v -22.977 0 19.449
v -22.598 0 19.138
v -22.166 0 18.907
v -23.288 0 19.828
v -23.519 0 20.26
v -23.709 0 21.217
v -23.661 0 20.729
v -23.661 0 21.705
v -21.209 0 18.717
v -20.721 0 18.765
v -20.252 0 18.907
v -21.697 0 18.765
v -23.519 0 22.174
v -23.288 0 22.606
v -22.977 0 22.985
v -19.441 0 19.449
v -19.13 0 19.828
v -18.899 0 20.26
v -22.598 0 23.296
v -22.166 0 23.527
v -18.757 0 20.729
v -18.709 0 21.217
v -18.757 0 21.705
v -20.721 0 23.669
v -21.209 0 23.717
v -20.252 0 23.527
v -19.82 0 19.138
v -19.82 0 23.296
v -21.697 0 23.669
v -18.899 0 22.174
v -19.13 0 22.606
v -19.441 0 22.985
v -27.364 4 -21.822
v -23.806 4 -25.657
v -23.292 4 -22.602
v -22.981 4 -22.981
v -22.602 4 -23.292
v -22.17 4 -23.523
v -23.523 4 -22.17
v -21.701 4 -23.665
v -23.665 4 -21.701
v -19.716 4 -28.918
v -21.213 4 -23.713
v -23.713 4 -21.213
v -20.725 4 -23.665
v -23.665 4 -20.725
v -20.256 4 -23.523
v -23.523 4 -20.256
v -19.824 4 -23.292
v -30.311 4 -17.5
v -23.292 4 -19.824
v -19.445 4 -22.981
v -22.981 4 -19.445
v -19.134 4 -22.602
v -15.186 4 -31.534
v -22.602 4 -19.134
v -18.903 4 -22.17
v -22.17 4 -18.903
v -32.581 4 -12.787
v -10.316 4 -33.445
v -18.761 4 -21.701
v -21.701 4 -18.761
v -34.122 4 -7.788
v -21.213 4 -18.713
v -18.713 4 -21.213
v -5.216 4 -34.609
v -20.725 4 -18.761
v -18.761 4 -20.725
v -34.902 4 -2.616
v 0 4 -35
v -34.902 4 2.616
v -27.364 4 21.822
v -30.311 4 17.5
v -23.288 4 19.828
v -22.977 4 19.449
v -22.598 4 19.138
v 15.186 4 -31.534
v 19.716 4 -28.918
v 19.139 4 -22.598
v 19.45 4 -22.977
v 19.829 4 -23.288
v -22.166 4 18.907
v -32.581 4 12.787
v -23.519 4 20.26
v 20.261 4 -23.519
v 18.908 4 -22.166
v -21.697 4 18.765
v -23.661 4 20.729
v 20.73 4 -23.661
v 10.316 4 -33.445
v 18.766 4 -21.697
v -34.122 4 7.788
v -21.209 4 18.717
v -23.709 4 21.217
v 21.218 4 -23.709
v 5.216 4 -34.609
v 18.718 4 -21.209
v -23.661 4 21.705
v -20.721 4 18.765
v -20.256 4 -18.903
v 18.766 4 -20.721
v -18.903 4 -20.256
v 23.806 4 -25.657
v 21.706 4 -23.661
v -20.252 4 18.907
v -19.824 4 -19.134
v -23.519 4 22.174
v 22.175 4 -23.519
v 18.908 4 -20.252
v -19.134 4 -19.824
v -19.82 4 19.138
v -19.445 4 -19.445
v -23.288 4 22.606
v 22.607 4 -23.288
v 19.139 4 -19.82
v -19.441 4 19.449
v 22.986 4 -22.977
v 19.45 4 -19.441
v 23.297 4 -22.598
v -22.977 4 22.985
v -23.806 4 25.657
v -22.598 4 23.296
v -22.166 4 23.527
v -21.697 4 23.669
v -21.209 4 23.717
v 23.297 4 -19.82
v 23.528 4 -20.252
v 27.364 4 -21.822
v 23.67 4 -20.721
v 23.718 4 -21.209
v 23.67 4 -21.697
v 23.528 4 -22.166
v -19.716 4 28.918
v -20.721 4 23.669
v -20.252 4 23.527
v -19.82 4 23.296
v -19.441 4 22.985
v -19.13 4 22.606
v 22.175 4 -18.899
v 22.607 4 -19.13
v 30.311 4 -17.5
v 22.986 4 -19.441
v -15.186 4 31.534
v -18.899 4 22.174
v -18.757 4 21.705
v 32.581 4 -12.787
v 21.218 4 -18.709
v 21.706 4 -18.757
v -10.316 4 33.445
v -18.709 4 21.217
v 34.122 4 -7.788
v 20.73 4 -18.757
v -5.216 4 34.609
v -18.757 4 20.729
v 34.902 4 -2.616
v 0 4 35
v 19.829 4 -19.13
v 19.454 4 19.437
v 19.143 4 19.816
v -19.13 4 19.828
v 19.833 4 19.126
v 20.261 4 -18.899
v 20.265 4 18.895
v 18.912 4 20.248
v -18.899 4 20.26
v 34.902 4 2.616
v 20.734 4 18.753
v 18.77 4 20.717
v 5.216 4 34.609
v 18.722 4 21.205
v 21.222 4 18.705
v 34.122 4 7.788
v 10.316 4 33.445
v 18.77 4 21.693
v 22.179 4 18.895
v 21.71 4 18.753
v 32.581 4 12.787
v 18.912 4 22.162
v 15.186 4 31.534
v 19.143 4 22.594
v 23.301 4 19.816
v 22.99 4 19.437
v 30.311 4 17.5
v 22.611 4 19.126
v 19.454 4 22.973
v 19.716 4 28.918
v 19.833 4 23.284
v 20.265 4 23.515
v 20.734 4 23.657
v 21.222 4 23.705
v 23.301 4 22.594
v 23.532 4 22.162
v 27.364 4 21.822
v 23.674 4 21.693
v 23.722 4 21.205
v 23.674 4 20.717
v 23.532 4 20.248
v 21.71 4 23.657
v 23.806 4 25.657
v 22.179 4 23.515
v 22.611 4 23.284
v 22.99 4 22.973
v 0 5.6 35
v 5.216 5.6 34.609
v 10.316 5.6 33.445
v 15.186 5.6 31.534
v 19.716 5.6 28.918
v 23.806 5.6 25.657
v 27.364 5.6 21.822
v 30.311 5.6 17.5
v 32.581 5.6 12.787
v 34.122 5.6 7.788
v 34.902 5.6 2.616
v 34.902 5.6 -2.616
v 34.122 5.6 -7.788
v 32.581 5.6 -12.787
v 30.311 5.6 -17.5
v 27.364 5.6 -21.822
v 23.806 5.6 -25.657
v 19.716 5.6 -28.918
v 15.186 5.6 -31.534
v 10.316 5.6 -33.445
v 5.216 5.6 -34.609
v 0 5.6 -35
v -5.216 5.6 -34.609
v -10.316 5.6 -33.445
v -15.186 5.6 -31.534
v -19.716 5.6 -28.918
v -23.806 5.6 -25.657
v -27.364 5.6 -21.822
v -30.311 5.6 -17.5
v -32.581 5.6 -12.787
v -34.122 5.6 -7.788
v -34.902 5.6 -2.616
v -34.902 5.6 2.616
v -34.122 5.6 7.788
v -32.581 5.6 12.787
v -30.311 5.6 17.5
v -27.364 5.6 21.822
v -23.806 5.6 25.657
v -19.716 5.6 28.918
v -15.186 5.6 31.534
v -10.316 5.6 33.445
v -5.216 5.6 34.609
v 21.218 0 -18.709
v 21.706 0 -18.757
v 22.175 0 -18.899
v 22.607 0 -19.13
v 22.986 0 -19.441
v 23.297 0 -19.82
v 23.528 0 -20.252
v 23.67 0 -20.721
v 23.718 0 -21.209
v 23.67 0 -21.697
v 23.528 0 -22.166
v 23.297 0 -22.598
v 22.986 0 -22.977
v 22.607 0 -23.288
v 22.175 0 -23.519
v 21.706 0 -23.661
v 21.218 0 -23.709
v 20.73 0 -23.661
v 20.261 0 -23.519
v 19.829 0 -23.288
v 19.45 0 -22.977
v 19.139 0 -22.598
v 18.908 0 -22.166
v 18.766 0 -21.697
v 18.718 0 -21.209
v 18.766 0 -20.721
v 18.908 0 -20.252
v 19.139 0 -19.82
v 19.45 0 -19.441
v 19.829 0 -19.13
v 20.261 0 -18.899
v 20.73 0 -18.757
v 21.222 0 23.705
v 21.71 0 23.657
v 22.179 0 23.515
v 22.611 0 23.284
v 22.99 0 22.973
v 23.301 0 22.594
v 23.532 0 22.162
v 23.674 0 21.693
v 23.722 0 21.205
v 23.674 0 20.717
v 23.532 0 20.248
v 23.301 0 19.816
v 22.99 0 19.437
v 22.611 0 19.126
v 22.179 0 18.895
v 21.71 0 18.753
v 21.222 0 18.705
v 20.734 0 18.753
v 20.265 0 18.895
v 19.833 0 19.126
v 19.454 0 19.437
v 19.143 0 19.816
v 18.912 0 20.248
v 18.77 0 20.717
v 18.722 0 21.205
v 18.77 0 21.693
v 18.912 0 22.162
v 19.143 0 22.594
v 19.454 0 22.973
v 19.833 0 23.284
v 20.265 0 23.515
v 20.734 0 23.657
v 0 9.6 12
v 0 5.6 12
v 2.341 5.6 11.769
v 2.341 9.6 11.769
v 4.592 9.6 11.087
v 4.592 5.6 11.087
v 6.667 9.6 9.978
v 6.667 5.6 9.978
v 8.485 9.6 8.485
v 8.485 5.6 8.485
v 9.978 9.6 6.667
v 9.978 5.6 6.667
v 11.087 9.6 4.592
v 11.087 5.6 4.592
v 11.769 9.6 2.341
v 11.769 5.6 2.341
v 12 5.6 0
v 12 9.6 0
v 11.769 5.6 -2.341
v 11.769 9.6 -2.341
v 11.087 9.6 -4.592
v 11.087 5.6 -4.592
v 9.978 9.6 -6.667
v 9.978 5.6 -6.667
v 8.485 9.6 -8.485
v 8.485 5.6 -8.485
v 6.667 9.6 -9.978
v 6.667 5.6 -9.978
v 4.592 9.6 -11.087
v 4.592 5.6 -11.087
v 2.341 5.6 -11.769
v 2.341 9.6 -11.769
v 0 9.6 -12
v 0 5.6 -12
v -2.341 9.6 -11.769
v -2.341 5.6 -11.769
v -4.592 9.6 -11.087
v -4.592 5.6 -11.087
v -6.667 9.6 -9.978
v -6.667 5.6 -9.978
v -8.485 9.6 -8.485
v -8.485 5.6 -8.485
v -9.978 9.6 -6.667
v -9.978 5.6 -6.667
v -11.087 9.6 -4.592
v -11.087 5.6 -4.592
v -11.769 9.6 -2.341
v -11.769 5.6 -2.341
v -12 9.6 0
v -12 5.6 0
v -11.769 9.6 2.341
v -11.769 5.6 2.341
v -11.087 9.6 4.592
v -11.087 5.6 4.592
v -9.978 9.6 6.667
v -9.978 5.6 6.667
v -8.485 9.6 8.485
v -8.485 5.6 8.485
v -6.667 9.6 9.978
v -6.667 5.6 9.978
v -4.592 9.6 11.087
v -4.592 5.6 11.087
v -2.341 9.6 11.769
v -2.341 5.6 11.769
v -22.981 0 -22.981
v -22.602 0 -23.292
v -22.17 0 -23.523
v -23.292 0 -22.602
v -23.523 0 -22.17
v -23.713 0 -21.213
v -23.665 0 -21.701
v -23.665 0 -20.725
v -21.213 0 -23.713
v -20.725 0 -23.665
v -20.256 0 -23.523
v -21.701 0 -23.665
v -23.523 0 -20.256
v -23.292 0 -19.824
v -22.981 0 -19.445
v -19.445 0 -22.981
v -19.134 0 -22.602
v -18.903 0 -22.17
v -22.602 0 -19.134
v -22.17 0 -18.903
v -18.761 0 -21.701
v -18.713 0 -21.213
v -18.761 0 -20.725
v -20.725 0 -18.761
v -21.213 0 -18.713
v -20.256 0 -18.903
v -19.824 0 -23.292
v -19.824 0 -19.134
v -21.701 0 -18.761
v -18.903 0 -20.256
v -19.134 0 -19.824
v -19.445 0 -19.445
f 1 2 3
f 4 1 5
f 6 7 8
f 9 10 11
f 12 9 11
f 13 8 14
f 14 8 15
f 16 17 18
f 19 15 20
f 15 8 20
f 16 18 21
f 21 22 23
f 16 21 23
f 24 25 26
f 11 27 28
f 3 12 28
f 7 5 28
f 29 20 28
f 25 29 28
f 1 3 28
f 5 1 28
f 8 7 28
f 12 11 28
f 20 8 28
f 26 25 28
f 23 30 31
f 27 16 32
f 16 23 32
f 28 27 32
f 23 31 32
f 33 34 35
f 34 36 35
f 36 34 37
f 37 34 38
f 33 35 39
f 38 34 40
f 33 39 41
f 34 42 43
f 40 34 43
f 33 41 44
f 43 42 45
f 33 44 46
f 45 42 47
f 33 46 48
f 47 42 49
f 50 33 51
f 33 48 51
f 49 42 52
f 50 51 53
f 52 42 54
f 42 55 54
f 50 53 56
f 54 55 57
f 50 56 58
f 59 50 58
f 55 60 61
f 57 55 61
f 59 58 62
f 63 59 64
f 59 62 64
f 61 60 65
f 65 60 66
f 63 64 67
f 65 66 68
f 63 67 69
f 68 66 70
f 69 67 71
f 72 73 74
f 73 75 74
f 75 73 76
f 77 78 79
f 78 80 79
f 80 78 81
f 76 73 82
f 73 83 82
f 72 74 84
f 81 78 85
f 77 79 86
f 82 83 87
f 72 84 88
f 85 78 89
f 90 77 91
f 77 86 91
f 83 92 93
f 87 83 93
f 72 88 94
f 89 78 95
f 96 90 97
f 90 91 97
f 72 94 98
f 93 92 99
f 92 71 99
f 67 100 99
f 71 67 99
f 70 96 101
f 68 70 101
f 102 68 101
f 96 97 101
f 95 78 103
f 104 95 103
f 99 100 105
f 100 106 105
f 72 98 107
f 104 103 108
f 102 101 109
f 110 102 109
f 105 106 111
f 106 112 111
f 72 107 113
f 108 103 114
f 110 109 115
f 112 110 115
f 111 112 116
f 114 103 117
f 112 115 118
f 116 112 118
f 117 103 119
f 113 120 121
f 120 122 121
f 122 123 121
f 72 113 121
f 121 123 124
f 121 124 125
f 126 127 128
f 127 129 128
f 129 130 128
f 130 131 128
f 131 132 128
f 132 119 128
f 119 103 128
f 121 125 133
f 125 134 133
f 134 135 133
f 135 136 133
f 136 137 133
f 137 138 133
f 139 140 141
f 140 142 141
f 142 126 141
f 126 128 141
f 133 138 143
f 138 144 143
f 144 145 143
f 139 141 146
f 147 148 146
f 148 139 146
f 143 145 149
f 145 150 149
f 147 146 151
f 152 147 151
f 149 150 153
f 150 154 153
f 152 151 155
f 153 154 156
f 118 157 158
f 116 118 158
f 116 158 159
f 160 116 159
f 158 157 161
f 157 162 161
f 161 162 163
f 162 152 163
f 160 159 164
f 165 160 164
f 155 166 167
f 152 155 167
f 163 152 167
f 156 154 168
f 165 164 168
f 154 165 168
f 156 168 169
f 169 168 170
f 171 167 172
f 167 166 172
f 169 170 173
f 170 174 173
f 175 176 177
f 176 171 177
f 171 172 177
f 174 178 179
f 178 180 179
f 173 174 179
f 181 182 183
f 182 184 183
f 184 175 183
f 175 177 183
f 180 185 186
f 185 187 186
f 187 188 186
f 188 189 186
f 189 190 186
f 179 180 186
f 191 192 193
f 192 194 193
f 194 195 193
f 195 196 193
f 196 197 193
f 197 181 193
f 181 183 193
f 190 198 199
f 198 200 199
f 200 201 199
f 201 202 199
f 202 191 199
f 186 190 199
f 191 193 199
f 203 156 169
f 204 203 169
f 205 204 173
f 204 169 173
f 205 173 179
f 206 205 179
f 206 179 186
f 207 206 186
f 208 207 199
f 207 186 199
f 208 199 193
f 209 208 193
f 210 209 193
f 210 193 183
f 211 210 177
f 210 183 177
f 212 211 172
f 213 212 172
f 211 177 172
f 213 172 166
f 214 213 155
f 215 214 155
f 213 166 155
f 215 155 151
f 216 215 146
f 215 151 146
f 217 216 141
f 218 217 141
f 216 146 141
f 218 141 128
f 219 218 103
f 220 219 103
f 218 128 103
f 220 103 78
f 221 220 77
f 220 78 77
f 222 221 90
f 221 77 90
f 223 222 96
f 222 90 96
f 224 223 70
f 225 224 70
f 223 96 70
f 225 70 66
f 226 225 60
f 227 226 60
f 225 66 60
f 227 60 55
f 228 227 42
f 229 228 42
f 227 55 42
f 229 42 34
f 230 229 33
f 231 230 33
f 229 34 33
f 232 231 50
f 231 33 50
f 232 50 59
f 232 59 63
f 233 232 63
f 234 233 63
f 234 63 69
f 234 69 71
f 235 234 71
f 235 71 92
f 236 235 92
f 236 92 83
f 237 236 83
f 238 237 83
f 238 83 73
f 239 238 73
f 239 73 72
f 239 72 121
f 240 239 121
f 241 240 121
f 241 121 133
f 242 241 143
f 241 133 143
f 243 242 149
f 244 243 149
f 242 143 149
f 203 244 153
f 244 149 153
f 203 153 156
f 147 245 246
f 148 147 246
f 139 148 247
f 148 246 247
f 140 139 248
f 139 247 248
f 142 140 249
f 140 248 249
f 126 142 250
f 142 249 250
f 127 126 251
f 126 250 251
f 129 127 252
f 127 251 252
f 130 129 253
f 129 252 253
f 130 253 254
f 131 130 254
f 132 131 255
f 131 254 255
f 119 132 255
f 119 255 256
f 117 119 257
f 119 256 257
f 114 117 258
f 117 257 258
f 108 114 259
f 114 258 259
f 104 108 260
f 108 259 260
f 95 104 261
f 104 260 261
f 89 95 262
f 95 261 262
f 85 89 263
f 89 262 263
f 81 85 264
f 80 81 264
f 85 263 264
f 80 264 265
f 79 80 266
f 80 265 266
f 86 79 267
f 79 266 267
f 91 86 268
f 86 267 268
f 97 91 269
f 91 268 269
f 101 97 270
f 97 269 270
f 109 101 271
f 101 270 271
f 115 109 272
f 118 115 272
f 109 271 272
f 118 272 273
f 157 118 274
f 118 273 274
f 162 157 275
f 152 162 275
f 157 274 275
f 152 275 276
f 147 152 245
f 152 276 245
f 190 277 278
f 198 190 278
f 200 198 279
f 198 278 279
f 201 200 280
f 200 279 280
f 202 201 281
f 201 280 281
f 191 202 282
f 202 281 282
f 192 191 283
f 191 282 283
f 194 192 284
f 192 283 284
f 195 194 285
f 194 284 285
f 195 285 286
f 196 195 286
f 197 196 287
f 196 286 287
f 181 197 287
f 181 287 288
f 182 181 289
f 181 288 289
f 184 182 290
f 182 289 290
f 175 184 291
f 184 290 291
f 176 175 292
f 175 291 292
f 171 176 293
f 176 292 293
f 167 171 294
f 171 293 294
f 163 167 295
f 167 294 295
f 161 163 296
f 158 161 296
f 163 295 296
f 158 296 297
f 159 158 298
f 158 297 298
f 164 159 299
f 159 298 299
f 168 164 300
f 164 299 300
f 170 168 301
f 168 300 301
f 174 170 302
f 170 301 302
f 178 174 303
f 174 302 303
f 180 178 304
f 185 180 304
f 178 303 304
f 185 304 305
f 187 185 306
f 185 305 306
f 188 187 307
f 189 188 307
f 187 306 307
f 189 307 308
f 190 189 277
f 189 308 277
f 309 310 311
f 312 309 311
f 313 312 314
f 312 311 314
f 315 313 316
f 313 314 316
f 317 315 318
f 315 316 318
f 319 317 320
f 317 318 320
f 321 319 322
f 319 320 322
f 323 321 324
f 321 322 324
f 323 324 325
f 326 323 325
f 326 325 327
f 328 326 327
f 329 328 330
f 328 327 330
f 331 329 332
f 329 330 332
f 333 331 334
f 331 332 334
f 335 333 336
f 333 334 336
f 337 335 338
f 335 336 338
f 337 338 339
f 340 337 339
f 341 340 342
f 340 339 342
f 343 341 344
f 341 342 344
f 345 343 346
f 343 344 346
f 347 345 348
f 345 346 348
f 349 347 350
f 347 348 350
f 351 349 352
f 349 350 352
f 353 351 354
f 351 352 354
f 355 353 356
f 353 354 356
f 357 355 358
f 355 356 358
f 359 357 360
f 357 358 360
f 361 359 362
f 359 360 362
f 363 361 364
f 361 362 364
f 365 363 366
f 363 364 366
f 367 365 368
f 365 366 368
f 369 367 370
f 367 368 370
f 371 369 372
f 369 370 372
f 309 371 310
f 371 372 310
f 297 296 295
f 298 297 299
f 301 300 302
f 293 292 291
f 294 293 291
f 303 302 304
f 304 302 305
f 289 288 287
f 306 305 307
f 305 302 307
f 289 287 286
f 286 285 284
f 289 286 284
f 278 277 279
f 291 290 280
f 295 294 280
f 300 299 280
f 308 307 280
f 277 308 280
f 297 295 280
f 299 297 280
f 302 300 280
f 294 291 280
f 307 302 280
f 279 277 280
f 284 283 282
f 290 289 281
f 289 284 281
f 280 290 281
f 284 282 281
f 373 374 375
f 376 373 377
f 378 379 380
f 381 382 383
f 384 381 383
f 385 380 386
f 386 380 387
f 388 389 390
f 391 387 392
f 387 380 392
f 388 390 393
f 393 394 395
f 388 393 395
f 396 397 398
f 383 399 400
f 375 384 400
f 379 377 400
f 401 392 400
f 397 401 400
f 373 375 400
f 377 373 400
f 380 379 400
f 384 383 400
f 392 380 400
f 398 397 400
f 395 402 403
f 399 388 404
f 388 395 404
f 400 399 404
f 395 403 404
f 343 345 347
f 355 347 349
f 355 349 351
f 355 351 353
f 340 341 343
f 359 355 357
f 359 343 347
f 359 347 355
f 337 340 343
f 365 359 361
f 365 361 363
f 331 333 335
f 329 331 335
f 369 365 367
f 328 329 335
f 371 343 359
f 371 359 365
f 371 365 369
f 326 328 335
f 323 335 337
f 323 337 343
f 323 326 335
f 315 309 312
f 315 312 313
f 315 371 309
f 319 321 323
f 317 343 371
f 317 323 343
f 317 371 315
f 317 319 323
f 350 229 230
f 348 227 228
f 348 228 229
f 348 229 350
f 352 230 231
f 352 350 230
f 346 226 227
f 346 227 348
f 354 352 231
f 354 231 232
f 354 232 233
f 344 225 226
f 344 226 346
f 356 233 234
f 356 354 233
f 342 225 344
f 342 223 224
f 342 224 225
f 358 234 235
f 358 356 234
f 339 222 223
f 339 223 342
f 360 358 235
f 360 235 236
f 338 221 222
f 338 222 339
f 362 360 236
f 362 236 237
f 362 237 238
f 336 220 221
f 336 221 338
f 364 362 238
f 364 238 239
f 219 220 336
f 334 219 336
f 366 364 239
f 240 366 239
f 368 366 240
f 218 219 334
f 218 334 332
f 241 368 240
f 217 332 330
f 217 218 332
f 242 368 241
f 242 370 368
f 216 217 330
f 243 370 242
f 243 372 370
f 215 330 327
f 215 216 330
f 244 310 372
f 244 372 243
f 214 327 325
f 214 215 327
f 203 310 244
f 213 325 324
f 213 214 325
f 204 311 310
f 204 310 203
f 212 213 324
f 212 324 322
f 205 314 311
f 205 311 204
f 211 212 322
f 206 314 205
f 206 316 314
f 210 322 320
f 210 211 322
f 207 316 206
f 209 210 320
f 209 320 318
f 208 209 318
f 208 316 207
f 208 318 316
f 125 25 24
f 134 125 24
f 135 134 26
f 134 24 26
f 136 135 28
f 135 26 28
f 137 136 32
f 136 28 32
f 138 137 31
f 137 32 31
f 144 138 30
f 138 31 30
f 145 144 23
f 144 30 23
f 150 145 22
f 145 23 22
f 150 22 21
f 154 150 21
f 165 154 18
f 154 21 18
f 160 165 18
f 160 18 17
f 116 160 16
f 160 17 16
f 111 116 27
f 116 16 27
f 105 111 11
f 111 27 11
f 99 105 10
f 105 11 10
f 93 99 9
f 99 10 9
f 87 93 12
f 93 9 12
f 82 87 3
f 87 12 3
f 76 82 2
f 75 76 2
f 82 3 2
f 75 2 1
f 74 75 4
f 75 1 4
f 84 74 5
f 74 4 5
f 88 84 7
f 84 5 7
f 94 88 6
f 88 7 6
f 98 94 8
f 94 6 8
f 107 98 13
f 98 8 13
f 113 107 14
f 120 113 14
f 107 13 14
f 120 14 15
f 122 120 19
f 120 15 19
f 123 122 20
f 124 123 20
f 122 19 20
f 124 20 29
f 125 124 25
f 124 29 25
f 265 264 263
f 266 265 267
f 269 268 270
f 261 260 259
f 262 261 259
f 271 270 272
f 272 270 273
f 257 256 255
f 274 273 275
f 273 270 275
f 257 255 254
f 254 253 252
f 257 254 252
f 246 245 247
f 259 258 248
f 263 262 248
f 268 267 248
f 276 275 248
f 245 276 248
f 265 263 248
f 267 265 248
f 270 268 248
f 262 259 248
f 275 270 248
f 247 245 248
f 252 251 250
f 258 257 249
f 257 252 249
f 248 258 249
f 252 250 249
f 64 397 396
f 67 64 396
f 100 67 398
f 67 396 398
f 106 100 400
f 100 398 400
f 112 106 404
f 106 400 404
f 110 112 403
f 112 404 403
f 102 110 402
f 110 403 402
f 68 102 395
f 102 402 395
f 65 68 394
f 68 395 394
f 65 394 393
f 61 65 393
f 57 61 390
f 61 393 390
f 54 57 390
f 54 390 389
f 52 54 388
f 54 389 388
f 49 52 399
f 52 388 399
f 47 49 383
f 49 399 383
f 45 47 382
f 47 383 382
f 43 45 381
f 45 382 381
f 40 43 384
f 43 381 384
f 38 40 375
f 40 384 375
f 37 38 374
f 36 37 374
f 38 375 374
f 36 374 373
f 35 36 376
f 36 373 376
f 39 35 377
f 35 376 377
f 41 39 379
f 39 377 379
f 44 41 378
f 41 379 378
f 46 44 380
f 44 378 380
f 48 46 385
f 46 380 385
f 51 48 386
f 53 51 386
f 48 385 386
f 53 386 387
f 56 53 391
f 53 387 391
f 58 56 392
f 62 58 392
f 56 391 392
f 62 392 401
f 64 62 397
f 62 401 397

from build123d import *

# Parameters (mm, degrees)
SK_P01_STANDOFF_R           = 2.5
P01_STANDOFF_DEPTH          = 4
SK_P02_STANDOFF_R           = 2.5
P02_STANDOFF_DEPTH          = 4
SK_P03_STANDOFF_R           = 2.5
P03_STANDOFF_DEPTH          = 4
SK_P04_STANDOFF_R           = 2.5
P04_STANDOFF_DEPTH          = 4
P05_MICARRAYBOARD70MM_START = 4
SK_P05_MICARRAYBOARD70MM_R  = 35
P05_MICARRAYBOARD70MM_DEPTH = 1.6
P06_DSPANDLEDS_START        = 5.6
SK_P06_DSPANDLEDS_R         = 12
P06_DSPANDLEDS_DEPTH        = 4


with BuildPart() as part:
    # SK_P01_Standoff → P01_Standoff (new body)
    with BuildSketch(Plane(origin=(0, 0, 0), x_dir=(1, 0, 0), z_dir=(0, 1, 0))):
        with Locations(Location((21.222, -21.205, 0), (0, 0, 270))):
            Circle(SK_P01_STANDOFF_R)
    extrude(amount=P01_STANDOFF_DEPTH)



with BuildPart() as body_2:
    # SK_P02_Standoff → P02_Standoff (new body)
    with BuildSketch(Plane(origin=(0, 0, 0), x_dir=(1, 0, 0), z_dir=(0, 1, 0))):
        with Locations(Location((-21.209, -21.217, 0), (0, 0, 270))):
            Circle(SK_P02_STANDOFF_R)
    extrude(amount=P02_STANDOFF_DEPTH)


with BuildPart() as body_3:
    # SK_P03_Standoff → P03_Standoff (new body)
    with BuildSketch(Plane(origin=(0, 0, 0), x_dir=(1, 0, 0), z_dir=(0, 1, 0))):
        with Locations(Location((-21.213, 21.213, 0), (0, 0, 270))):
            Circle(SK_P03_STANDOFF_R)
    extrude(amount=P03_STANDOFF_DEPTH)


with BuildPart() as body_4:
    # SK_P04_Standoff → P04_Standoff (new body)
    with BuildSketch(Plane(origin=(0, 0, 0), x_dir=(1, 0, 0), z_dir=(0, 1, 0))):
        with Locations(Location((21.218, 21.209, 0), (0, 0, 270))):
            Circle(SK_P04_STANDOFF_R)
    extrude(amount=P04_STANDOFF_DEPTH)


with BuildPart() as part_1:
    add(part.part)

    add(body_2.part)  # P05_Micarrayboard70mm merges body 2

    add(body_3.part)  # P05_Micarrayboard70mm merges body 3

    add(body_4.part)  # P05_Micarrayboard70mm merges body 4
    # SK_P05_Micarrayboard70mm → P05_Micarrayboard70mm (add)
    with BuildSketch(Plane(origin=(0, 0, 0), x_dir=(1, 0, 0), z_dir=(0, 1, 0)).offset(P05_MICARRAYBOARD70MM_START)):
        with Locations(Location((0, 0, 0), (0, 0, 270))):
            Circle(SK_P05_MICARRAYBOARD70MM_R)
    extrude(amount=P05_MICARRAYBOARD70MM_DEPTH)

    # SK_P06_DSPandLEDs → P06_DSPandLEDs (add)
    with BuildSketch(Plane(origin=(0, 0, 0), x_dir=(1, 0, 0), z_dir=(0, 1, 0)).offset(P06_DSPANDLEDS_START)):
        with Locations(Location((0, 0, 0), (0, 0, 270))):
            Circle(SK_P06_DSPANDLEDS_R)
    extrude(amount=P06_DSPANDLEDS_DEPTH)


solid = part_1.part
